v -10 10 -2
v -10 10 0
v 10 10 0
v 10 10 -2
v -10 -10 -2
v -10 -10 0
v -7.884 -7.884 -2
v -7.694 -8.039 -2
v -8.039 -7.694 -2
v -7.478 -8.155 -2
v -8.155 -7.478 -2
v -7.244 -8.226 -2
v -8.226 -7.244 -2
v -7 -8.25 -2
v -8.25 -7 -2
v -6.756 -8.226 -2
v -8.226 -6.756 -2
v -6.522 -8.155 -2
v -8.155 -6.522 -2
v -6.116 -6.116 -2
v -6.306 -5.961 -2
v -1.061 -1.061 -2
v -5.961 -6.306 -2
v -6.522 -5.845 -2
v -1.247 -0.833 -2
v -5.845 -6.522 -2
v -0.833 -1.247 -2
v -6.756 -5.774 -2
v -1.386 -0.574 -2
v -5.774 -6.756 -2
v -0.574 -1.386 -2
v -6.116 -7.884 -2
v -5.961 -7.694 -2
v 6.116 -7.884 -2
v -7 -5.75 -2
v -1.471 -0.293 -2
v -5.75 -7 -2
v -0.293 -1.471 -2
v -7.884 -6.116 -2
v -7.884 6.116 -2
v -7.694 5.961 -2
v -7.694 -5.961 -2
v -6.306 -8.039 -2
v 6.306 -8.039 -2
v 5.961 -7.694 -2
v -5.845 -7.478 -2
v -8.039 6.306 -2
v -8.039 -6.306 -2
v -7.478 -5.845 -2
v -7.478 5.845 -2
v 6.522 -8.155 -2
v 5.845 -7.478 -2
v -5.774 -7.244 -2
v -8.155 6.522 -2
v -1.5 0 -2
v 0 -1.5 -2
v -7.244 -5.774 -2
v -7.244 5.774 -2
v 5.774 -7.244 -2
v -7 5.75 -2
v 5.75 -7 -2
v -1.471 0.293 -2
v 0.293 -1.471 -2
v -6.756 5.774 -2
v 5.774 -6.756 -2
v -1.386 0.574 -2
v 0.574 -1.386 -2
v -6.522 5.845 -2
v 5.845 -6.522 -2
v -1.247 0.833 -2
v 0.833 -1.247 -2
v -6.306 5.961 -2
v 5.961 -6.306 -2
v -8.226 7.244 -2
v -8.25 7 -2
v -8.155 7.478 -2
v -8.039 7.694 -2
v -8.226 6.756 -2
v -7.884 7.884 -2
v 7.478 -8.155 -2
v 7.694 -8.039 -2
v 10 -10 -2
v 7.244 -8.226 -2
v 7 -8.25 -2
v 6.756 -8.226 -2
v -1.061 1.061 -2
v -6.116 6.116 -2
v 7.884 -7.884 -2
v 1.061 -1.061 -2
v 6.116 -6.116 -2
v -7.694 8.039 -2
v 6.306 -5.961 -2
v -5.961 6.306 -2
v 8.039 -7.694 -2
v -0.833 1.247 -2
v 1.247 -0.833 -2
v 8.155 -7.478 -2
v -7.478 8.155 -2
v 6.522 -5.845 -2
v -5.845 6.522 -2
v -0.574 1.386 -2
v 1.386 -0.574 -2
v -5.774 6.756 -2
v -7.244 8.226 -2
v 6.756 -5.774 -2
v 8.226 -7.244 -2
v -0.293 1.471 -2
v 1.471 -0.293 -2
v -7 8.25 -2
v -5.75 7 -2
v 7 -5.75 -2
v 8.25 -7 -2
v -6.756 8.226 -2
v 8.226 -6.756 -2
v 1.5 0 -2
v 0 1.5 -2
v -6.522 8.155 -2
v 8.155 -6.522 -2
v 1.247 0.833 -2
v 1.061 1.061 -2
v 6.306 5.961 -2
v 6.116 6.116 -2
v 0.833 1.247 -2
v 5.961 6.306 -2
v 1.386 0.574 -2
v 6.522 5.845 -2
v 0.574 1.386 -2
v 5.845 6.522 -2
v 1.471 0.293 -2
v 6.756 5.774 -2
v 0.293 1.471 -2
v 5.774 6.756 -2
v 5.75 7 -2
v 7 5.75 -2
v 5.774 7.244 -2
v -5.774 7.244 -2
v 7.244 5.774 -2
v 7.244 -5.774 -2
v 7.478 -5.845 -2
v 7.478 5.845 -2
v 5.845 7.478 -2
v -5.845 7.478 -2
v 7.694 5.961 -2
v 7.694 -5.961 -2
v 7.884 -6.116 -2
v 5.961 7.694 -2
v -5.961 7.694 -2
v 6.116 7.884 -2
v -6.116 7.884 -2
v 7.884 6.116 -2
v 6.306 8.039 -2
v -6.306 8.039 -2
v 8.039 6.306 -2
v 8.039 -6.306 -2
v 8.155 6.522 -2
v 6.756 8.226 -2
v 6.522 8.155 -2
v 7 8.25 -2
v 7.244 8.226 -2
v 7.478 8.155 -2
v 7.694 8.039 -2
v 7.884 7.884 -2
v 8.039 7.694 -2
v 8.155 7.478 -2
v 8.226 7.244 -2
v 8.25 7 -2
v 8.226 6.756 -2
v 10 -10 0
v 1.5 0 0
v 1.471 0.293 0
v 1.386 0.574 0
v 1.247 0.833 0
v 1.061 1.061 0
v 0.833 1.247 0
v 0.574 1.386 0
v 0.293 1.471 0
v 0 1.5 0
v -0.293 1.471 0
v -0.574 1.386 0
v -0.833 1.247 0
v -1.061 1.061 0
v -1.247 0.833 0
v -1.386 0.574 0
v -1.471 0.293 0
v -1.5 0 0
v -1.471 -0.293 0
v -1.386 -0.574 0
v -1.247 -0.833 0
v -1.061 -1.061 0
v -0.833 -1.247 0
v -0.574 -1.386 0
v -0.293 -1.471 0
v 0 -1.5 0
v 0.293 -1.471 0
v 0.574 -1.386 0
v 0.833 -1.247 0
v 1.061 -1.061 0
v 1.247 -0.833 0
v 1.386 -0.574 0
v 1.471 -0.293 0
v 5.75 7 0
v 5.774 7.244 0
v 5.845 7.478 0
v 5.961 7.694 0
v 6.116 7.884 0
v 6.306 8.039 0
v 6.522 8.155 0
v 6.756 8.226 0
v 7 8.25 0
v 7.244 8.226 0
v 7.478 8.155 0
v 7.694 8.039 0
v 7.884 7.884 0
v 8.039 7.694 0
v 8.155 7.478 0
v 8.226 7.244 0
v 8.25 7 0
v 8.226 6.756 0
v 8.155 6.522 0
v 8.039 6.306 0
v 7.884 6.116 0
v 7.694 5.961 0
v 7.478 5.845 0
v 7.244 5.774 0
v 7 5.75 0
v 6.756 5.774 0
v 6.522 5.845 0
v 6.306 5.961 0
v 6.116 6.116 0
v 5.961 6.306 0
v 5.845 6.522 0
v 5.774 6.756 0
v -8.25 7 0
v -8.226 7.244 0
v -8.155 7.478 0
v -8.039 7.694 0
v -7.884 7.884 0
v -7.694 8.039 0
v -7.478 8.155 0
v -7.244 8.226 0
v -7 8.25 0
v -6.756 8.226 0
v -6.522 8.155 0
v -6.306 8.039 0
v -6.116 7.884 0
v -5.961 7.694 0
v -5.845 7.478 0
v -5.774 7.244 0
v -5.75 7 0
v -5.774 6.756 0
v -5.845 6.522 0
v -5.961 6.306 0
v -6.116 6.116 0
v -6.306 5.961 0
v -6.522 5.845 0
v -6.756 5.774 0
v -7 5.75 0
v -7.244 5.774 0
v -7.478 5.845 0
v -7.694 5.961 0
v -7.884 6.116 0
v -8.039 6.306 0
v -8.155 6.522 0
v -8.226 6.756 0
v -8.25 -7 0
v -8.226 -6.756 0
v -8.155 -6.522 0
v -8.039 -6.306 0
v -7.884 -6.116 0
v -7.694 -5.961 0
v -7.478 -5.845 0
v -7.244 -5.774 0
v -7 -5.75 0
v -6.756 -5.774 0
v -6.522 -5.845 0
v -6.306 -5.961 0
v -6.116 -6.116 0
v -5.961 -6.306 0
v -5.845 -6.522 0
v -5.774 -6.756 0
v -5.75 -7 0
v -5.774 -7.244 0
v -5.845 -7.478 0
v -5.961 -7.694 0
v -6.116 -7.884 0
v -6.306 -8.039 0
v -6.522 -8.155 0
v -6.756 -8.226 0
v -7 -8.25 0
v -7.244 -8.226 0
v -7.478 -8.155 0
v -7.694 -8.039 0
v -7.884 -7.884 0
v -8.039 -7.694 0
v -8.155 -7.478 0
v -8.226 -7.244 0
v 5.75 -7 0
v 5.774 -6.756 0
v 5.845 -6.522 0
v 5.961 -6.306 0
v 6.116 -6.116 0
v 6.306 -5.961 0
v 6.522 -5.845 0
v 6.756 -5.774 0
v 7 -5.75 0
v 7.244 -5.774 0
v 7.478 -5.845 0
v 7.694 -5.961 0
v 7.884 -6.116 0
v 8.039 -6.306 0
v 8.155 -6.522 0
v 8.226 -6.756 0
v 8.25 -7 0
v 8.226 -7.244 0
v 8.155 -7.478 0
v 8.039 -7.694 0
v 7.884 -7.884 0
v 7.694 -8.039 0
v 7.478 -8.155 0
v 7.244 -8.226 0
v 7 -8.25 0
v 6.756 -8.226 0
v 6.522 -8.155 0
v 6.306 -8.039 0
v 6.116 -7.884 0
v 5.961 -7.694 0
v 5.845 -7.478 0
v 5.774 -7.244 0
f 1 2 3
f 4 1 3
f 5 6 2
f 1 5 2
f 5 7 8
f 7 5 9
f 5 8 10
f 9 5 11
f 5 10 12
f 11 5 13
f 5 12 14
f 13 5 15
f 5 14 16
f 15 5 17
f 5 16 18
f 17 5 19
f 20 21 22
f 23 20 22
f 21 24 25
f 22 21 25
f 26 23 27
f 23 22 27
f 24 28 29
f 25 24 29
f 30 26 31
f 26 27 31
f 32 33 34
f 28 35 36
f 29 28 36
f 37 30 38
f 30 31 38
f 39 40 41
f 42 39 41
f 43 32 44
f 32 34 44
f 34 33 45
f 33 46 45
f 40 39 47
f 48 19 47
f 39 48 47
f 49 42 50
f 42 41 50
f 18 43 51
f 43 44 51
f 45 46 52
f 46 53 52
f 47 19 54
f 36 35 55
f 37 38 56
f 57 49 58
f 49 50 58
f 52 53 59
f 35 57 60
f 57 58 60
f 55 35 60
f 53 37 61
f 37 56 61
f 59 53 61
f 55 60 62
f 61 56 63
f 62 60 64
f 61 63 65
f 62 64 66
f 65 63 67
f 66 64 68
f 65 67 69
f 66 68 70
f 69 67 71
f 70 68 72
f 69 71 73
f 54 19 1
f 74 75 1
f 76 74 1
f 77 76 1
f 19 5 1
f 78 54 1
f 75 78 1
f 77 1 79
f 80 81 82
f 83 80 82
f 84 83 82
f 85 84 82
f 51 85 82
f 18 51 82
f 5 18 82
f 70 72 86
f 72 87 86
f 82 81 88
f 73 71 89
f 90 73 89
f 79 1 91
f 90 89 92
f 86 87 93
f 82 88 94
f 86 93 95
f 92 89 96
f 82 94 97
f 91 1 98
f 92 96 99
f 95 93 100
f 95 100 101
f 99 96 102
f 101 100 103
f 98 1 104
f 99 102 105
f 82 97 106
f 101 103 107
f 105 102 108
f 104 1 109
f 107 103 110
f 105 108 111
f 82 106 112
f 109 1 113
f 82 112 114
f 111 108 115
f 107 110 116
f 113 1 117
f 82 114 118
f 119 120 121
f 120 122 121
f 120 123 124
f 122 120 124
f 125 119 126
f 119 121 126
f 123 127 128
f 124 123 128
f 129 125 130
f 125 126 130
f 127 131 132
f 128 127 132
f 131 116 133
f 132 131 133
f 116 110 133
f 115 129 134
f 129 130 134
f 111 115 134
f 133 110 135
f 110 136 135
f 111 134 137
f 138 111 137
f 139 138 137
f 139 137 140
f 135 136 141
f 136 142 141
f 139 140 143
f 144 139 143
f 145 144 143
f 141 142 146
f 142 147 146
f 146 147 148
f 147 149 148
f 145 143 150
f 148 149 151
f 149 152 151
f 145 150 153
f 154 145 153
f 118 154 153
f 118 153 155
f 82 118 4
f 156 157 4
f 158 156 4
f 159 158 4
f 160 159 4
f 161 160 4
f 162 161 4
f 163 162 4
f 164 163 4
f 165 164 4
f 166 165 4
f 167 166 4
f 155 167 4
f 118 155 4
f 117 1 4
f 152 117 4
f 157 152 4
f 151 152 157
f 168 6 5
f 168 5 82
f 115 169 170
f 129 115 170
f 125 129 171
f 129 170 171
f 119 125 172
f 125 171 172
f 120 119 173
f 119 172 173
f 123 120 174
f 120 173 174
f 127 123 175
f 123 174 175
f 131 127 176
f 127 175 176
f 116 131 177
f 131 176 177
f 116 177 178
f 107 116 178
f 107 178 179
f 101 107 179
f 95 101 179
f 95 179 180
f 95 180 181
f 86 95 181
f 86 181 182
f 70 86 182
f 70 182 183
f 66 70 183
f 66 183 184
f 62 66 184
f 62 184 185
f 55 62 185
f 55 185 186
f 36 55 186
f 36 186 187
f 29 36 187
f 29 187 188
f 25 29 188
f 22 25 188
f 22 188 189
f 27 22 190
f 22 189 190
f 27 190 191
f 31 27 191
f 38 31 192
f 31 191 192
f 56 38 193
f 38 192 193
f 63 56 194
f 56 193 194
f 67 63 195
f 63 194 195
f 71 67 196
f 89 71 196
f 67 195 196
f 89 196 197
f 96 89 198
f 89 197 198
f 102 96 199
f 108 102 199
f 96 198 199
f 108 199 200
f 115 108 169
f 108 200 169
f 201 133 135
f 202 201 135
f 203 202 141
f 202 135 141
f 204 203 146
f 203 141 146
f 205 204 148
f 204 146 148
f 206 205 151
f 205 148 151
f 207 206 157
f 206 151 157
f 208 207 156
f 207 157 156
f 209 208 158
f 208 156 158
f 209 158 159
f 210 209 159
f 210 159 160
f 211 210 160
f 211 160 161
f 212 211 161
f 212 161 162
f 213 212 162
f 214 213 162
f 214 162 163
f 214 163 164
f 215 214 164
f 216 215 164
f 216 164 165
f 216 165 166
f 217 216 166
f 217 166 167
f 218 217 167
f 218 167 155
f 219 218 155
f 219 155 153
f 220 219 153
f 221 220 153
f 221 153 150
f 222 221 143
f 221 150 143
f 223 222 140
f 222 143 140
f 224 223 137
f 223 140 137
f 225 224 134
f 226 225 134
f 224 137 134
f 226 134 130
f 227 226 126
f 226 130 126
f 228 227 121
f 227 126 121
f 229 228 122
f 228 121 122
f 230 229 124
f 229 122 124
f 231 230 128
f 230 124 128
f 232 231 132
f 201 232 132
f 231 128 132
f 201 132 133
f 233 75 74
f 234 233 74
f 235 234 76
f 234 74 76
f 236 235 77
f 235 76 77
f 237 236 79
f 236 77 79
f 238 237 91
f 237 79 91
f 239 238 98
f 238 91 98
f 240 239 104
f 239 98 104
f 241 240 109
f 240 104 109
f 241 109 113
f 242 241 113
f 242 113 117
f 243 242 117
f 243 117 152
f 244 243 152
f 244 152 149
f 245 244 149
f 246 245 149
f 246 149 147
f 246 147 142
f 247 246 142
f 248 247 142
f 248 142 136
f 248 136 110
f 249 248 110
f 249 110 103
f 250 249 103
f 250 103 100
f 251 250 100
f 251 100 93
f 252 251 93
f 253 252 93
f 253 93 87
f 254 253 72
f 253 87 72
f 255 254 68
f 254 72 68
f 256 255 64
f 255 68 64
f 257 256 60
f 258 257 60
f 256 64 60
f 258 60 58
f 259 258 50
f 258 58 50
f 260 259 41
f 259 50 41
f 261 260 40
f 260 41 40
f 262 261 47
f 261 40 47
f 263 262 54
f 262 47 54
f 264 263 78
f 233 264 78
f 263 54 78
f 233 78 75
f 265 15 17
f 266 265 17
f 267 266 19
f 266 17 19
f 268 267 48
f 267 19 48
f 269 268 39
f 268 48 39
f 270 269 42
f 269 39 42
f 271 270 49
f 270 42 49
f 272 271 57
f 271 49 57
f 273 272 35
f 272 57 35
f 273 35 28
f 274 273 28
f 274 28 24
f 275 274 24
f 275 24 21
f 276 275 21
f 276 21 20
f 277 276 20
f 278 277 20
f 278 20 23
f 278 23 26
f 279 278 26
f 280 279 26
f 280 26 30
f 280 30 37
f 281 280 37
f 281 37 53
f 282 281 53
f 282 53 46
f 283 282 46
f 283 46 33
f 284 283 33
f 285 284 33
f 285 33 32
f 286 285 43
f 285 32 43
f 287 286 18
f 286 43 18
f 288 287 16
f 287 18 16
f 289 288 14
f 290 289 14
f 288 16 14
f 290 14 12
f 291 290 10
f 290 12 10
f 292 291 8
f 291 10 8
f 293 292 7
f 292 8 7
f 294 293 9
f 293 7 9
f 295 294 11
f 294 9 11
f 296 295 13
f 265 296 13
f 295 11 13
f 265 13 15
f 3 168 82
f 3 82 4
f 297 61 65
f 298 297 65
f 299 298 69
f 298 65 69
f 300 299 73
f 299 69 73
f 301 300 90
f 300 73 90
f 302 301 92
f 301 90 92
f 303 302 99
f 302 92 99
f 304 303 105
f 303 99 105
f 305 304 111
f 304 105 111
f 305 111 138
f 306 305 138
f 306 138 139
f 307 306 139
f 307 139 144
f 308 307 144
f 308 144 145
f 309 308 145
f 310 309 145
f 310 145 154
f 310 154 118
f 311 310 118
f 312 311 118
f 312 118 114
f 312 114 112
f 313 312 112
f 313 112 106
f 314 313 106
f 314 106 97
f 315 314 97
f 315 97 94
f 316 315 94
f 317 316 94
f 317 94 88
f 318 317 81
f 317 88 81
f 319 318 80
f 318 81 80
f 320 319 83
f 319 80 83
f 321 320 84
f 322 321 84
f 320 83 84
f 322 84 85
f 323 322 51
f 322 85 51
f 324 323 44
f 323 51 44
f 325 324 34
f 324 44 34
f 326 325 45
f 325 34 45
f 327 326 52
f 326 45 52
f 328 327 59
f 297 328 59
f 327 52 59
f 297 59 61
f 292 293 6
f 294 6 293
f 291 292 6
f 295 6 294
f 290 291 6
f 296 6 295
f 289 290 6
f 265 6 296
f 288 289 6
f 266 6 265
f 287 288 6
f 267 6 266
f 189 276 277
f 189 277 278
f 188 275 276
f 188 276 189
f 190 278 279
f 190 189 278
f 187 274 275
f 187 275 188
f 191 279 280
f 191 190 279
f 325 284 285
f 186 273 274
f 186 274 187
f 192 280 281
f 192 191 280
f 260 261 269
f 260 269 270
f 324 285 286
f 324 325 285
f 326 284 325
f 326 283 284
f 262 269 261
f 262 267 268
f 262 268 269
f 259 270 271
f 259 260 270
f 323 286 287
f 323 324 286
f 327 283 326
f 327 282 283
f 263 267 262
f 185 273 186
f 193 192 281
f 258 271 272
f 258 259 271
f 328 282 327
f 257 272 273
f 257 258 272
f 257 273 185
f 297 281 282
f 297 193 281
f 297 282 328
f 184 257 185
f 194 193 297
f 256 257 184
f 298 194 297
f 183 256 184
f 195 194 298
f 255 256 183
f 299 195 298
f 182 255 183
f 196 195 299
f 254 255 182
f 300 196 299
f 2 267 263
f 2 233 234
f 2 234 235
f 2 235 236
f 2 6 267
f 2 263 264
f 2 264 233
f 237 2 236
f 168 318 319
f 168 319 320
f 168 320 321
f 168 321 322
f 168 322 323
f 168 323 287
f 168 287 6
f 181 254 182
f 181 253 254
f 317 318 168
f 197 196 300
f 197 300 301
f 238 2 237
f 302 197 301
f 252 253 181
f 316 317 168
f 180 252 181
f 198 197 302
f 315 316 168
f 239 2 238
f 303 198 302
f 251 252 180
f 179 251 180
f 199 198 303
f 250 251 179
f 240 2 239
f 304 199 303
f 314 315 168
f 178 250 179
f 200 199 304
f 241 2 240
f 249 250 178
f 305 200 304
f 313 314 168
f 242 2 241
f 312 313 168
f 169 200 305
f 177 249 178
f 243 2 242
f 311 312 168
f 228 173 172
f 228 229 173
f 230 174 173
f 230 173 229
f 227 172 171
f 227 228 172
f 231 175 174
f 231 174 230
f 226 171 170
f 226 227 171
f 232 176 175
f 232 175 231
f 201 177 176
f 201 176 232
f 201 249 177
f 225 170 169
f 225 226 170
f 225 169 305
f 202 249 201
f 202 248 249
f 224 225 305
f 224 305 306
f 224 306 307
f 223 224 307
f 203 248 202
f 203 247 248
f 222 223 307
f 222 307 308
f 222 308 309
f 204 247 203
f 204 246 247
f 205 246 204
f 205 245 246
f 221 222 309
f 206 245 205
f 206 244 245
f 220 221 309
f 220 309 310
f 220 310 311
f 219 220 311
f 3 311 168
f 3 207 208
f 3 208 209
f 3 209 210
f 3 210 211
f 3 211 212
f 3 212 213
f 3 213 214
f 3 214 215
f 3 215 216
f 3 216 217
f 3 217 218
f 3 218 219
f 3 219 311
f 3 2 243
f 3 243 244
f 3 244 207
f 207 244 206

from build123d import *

# Parameters (mm, degrees)
F0_W     = 20
F0_H     = 20
F1_DEPTH = 2
F3_D     = 2.5
F4_R     = 1.5
F5_DEPTH = 25


with BuildPart() as f1:
    # F0 (on Top) → F1 (new body)
    with BuildSketch(Plane.XY):
        Rectangle(F0_W, F0_H)
    extrude(amount=-F1_DEPTH)

    # F3 (through all)
    with Locations(Plane.XY):
        with Locations((-7, 7), (7, 7), (-7, -7), (7, -7)):
            Hole(F3_D / 2)

    # F4 (on face) → F5 (cut)
    with BuildSketch(Plane.XY):
        Circle(F4_R)
    extrude(amount=-F5_DEPTH, mode=Mode.SUBTRACT)


solid = f1.part
